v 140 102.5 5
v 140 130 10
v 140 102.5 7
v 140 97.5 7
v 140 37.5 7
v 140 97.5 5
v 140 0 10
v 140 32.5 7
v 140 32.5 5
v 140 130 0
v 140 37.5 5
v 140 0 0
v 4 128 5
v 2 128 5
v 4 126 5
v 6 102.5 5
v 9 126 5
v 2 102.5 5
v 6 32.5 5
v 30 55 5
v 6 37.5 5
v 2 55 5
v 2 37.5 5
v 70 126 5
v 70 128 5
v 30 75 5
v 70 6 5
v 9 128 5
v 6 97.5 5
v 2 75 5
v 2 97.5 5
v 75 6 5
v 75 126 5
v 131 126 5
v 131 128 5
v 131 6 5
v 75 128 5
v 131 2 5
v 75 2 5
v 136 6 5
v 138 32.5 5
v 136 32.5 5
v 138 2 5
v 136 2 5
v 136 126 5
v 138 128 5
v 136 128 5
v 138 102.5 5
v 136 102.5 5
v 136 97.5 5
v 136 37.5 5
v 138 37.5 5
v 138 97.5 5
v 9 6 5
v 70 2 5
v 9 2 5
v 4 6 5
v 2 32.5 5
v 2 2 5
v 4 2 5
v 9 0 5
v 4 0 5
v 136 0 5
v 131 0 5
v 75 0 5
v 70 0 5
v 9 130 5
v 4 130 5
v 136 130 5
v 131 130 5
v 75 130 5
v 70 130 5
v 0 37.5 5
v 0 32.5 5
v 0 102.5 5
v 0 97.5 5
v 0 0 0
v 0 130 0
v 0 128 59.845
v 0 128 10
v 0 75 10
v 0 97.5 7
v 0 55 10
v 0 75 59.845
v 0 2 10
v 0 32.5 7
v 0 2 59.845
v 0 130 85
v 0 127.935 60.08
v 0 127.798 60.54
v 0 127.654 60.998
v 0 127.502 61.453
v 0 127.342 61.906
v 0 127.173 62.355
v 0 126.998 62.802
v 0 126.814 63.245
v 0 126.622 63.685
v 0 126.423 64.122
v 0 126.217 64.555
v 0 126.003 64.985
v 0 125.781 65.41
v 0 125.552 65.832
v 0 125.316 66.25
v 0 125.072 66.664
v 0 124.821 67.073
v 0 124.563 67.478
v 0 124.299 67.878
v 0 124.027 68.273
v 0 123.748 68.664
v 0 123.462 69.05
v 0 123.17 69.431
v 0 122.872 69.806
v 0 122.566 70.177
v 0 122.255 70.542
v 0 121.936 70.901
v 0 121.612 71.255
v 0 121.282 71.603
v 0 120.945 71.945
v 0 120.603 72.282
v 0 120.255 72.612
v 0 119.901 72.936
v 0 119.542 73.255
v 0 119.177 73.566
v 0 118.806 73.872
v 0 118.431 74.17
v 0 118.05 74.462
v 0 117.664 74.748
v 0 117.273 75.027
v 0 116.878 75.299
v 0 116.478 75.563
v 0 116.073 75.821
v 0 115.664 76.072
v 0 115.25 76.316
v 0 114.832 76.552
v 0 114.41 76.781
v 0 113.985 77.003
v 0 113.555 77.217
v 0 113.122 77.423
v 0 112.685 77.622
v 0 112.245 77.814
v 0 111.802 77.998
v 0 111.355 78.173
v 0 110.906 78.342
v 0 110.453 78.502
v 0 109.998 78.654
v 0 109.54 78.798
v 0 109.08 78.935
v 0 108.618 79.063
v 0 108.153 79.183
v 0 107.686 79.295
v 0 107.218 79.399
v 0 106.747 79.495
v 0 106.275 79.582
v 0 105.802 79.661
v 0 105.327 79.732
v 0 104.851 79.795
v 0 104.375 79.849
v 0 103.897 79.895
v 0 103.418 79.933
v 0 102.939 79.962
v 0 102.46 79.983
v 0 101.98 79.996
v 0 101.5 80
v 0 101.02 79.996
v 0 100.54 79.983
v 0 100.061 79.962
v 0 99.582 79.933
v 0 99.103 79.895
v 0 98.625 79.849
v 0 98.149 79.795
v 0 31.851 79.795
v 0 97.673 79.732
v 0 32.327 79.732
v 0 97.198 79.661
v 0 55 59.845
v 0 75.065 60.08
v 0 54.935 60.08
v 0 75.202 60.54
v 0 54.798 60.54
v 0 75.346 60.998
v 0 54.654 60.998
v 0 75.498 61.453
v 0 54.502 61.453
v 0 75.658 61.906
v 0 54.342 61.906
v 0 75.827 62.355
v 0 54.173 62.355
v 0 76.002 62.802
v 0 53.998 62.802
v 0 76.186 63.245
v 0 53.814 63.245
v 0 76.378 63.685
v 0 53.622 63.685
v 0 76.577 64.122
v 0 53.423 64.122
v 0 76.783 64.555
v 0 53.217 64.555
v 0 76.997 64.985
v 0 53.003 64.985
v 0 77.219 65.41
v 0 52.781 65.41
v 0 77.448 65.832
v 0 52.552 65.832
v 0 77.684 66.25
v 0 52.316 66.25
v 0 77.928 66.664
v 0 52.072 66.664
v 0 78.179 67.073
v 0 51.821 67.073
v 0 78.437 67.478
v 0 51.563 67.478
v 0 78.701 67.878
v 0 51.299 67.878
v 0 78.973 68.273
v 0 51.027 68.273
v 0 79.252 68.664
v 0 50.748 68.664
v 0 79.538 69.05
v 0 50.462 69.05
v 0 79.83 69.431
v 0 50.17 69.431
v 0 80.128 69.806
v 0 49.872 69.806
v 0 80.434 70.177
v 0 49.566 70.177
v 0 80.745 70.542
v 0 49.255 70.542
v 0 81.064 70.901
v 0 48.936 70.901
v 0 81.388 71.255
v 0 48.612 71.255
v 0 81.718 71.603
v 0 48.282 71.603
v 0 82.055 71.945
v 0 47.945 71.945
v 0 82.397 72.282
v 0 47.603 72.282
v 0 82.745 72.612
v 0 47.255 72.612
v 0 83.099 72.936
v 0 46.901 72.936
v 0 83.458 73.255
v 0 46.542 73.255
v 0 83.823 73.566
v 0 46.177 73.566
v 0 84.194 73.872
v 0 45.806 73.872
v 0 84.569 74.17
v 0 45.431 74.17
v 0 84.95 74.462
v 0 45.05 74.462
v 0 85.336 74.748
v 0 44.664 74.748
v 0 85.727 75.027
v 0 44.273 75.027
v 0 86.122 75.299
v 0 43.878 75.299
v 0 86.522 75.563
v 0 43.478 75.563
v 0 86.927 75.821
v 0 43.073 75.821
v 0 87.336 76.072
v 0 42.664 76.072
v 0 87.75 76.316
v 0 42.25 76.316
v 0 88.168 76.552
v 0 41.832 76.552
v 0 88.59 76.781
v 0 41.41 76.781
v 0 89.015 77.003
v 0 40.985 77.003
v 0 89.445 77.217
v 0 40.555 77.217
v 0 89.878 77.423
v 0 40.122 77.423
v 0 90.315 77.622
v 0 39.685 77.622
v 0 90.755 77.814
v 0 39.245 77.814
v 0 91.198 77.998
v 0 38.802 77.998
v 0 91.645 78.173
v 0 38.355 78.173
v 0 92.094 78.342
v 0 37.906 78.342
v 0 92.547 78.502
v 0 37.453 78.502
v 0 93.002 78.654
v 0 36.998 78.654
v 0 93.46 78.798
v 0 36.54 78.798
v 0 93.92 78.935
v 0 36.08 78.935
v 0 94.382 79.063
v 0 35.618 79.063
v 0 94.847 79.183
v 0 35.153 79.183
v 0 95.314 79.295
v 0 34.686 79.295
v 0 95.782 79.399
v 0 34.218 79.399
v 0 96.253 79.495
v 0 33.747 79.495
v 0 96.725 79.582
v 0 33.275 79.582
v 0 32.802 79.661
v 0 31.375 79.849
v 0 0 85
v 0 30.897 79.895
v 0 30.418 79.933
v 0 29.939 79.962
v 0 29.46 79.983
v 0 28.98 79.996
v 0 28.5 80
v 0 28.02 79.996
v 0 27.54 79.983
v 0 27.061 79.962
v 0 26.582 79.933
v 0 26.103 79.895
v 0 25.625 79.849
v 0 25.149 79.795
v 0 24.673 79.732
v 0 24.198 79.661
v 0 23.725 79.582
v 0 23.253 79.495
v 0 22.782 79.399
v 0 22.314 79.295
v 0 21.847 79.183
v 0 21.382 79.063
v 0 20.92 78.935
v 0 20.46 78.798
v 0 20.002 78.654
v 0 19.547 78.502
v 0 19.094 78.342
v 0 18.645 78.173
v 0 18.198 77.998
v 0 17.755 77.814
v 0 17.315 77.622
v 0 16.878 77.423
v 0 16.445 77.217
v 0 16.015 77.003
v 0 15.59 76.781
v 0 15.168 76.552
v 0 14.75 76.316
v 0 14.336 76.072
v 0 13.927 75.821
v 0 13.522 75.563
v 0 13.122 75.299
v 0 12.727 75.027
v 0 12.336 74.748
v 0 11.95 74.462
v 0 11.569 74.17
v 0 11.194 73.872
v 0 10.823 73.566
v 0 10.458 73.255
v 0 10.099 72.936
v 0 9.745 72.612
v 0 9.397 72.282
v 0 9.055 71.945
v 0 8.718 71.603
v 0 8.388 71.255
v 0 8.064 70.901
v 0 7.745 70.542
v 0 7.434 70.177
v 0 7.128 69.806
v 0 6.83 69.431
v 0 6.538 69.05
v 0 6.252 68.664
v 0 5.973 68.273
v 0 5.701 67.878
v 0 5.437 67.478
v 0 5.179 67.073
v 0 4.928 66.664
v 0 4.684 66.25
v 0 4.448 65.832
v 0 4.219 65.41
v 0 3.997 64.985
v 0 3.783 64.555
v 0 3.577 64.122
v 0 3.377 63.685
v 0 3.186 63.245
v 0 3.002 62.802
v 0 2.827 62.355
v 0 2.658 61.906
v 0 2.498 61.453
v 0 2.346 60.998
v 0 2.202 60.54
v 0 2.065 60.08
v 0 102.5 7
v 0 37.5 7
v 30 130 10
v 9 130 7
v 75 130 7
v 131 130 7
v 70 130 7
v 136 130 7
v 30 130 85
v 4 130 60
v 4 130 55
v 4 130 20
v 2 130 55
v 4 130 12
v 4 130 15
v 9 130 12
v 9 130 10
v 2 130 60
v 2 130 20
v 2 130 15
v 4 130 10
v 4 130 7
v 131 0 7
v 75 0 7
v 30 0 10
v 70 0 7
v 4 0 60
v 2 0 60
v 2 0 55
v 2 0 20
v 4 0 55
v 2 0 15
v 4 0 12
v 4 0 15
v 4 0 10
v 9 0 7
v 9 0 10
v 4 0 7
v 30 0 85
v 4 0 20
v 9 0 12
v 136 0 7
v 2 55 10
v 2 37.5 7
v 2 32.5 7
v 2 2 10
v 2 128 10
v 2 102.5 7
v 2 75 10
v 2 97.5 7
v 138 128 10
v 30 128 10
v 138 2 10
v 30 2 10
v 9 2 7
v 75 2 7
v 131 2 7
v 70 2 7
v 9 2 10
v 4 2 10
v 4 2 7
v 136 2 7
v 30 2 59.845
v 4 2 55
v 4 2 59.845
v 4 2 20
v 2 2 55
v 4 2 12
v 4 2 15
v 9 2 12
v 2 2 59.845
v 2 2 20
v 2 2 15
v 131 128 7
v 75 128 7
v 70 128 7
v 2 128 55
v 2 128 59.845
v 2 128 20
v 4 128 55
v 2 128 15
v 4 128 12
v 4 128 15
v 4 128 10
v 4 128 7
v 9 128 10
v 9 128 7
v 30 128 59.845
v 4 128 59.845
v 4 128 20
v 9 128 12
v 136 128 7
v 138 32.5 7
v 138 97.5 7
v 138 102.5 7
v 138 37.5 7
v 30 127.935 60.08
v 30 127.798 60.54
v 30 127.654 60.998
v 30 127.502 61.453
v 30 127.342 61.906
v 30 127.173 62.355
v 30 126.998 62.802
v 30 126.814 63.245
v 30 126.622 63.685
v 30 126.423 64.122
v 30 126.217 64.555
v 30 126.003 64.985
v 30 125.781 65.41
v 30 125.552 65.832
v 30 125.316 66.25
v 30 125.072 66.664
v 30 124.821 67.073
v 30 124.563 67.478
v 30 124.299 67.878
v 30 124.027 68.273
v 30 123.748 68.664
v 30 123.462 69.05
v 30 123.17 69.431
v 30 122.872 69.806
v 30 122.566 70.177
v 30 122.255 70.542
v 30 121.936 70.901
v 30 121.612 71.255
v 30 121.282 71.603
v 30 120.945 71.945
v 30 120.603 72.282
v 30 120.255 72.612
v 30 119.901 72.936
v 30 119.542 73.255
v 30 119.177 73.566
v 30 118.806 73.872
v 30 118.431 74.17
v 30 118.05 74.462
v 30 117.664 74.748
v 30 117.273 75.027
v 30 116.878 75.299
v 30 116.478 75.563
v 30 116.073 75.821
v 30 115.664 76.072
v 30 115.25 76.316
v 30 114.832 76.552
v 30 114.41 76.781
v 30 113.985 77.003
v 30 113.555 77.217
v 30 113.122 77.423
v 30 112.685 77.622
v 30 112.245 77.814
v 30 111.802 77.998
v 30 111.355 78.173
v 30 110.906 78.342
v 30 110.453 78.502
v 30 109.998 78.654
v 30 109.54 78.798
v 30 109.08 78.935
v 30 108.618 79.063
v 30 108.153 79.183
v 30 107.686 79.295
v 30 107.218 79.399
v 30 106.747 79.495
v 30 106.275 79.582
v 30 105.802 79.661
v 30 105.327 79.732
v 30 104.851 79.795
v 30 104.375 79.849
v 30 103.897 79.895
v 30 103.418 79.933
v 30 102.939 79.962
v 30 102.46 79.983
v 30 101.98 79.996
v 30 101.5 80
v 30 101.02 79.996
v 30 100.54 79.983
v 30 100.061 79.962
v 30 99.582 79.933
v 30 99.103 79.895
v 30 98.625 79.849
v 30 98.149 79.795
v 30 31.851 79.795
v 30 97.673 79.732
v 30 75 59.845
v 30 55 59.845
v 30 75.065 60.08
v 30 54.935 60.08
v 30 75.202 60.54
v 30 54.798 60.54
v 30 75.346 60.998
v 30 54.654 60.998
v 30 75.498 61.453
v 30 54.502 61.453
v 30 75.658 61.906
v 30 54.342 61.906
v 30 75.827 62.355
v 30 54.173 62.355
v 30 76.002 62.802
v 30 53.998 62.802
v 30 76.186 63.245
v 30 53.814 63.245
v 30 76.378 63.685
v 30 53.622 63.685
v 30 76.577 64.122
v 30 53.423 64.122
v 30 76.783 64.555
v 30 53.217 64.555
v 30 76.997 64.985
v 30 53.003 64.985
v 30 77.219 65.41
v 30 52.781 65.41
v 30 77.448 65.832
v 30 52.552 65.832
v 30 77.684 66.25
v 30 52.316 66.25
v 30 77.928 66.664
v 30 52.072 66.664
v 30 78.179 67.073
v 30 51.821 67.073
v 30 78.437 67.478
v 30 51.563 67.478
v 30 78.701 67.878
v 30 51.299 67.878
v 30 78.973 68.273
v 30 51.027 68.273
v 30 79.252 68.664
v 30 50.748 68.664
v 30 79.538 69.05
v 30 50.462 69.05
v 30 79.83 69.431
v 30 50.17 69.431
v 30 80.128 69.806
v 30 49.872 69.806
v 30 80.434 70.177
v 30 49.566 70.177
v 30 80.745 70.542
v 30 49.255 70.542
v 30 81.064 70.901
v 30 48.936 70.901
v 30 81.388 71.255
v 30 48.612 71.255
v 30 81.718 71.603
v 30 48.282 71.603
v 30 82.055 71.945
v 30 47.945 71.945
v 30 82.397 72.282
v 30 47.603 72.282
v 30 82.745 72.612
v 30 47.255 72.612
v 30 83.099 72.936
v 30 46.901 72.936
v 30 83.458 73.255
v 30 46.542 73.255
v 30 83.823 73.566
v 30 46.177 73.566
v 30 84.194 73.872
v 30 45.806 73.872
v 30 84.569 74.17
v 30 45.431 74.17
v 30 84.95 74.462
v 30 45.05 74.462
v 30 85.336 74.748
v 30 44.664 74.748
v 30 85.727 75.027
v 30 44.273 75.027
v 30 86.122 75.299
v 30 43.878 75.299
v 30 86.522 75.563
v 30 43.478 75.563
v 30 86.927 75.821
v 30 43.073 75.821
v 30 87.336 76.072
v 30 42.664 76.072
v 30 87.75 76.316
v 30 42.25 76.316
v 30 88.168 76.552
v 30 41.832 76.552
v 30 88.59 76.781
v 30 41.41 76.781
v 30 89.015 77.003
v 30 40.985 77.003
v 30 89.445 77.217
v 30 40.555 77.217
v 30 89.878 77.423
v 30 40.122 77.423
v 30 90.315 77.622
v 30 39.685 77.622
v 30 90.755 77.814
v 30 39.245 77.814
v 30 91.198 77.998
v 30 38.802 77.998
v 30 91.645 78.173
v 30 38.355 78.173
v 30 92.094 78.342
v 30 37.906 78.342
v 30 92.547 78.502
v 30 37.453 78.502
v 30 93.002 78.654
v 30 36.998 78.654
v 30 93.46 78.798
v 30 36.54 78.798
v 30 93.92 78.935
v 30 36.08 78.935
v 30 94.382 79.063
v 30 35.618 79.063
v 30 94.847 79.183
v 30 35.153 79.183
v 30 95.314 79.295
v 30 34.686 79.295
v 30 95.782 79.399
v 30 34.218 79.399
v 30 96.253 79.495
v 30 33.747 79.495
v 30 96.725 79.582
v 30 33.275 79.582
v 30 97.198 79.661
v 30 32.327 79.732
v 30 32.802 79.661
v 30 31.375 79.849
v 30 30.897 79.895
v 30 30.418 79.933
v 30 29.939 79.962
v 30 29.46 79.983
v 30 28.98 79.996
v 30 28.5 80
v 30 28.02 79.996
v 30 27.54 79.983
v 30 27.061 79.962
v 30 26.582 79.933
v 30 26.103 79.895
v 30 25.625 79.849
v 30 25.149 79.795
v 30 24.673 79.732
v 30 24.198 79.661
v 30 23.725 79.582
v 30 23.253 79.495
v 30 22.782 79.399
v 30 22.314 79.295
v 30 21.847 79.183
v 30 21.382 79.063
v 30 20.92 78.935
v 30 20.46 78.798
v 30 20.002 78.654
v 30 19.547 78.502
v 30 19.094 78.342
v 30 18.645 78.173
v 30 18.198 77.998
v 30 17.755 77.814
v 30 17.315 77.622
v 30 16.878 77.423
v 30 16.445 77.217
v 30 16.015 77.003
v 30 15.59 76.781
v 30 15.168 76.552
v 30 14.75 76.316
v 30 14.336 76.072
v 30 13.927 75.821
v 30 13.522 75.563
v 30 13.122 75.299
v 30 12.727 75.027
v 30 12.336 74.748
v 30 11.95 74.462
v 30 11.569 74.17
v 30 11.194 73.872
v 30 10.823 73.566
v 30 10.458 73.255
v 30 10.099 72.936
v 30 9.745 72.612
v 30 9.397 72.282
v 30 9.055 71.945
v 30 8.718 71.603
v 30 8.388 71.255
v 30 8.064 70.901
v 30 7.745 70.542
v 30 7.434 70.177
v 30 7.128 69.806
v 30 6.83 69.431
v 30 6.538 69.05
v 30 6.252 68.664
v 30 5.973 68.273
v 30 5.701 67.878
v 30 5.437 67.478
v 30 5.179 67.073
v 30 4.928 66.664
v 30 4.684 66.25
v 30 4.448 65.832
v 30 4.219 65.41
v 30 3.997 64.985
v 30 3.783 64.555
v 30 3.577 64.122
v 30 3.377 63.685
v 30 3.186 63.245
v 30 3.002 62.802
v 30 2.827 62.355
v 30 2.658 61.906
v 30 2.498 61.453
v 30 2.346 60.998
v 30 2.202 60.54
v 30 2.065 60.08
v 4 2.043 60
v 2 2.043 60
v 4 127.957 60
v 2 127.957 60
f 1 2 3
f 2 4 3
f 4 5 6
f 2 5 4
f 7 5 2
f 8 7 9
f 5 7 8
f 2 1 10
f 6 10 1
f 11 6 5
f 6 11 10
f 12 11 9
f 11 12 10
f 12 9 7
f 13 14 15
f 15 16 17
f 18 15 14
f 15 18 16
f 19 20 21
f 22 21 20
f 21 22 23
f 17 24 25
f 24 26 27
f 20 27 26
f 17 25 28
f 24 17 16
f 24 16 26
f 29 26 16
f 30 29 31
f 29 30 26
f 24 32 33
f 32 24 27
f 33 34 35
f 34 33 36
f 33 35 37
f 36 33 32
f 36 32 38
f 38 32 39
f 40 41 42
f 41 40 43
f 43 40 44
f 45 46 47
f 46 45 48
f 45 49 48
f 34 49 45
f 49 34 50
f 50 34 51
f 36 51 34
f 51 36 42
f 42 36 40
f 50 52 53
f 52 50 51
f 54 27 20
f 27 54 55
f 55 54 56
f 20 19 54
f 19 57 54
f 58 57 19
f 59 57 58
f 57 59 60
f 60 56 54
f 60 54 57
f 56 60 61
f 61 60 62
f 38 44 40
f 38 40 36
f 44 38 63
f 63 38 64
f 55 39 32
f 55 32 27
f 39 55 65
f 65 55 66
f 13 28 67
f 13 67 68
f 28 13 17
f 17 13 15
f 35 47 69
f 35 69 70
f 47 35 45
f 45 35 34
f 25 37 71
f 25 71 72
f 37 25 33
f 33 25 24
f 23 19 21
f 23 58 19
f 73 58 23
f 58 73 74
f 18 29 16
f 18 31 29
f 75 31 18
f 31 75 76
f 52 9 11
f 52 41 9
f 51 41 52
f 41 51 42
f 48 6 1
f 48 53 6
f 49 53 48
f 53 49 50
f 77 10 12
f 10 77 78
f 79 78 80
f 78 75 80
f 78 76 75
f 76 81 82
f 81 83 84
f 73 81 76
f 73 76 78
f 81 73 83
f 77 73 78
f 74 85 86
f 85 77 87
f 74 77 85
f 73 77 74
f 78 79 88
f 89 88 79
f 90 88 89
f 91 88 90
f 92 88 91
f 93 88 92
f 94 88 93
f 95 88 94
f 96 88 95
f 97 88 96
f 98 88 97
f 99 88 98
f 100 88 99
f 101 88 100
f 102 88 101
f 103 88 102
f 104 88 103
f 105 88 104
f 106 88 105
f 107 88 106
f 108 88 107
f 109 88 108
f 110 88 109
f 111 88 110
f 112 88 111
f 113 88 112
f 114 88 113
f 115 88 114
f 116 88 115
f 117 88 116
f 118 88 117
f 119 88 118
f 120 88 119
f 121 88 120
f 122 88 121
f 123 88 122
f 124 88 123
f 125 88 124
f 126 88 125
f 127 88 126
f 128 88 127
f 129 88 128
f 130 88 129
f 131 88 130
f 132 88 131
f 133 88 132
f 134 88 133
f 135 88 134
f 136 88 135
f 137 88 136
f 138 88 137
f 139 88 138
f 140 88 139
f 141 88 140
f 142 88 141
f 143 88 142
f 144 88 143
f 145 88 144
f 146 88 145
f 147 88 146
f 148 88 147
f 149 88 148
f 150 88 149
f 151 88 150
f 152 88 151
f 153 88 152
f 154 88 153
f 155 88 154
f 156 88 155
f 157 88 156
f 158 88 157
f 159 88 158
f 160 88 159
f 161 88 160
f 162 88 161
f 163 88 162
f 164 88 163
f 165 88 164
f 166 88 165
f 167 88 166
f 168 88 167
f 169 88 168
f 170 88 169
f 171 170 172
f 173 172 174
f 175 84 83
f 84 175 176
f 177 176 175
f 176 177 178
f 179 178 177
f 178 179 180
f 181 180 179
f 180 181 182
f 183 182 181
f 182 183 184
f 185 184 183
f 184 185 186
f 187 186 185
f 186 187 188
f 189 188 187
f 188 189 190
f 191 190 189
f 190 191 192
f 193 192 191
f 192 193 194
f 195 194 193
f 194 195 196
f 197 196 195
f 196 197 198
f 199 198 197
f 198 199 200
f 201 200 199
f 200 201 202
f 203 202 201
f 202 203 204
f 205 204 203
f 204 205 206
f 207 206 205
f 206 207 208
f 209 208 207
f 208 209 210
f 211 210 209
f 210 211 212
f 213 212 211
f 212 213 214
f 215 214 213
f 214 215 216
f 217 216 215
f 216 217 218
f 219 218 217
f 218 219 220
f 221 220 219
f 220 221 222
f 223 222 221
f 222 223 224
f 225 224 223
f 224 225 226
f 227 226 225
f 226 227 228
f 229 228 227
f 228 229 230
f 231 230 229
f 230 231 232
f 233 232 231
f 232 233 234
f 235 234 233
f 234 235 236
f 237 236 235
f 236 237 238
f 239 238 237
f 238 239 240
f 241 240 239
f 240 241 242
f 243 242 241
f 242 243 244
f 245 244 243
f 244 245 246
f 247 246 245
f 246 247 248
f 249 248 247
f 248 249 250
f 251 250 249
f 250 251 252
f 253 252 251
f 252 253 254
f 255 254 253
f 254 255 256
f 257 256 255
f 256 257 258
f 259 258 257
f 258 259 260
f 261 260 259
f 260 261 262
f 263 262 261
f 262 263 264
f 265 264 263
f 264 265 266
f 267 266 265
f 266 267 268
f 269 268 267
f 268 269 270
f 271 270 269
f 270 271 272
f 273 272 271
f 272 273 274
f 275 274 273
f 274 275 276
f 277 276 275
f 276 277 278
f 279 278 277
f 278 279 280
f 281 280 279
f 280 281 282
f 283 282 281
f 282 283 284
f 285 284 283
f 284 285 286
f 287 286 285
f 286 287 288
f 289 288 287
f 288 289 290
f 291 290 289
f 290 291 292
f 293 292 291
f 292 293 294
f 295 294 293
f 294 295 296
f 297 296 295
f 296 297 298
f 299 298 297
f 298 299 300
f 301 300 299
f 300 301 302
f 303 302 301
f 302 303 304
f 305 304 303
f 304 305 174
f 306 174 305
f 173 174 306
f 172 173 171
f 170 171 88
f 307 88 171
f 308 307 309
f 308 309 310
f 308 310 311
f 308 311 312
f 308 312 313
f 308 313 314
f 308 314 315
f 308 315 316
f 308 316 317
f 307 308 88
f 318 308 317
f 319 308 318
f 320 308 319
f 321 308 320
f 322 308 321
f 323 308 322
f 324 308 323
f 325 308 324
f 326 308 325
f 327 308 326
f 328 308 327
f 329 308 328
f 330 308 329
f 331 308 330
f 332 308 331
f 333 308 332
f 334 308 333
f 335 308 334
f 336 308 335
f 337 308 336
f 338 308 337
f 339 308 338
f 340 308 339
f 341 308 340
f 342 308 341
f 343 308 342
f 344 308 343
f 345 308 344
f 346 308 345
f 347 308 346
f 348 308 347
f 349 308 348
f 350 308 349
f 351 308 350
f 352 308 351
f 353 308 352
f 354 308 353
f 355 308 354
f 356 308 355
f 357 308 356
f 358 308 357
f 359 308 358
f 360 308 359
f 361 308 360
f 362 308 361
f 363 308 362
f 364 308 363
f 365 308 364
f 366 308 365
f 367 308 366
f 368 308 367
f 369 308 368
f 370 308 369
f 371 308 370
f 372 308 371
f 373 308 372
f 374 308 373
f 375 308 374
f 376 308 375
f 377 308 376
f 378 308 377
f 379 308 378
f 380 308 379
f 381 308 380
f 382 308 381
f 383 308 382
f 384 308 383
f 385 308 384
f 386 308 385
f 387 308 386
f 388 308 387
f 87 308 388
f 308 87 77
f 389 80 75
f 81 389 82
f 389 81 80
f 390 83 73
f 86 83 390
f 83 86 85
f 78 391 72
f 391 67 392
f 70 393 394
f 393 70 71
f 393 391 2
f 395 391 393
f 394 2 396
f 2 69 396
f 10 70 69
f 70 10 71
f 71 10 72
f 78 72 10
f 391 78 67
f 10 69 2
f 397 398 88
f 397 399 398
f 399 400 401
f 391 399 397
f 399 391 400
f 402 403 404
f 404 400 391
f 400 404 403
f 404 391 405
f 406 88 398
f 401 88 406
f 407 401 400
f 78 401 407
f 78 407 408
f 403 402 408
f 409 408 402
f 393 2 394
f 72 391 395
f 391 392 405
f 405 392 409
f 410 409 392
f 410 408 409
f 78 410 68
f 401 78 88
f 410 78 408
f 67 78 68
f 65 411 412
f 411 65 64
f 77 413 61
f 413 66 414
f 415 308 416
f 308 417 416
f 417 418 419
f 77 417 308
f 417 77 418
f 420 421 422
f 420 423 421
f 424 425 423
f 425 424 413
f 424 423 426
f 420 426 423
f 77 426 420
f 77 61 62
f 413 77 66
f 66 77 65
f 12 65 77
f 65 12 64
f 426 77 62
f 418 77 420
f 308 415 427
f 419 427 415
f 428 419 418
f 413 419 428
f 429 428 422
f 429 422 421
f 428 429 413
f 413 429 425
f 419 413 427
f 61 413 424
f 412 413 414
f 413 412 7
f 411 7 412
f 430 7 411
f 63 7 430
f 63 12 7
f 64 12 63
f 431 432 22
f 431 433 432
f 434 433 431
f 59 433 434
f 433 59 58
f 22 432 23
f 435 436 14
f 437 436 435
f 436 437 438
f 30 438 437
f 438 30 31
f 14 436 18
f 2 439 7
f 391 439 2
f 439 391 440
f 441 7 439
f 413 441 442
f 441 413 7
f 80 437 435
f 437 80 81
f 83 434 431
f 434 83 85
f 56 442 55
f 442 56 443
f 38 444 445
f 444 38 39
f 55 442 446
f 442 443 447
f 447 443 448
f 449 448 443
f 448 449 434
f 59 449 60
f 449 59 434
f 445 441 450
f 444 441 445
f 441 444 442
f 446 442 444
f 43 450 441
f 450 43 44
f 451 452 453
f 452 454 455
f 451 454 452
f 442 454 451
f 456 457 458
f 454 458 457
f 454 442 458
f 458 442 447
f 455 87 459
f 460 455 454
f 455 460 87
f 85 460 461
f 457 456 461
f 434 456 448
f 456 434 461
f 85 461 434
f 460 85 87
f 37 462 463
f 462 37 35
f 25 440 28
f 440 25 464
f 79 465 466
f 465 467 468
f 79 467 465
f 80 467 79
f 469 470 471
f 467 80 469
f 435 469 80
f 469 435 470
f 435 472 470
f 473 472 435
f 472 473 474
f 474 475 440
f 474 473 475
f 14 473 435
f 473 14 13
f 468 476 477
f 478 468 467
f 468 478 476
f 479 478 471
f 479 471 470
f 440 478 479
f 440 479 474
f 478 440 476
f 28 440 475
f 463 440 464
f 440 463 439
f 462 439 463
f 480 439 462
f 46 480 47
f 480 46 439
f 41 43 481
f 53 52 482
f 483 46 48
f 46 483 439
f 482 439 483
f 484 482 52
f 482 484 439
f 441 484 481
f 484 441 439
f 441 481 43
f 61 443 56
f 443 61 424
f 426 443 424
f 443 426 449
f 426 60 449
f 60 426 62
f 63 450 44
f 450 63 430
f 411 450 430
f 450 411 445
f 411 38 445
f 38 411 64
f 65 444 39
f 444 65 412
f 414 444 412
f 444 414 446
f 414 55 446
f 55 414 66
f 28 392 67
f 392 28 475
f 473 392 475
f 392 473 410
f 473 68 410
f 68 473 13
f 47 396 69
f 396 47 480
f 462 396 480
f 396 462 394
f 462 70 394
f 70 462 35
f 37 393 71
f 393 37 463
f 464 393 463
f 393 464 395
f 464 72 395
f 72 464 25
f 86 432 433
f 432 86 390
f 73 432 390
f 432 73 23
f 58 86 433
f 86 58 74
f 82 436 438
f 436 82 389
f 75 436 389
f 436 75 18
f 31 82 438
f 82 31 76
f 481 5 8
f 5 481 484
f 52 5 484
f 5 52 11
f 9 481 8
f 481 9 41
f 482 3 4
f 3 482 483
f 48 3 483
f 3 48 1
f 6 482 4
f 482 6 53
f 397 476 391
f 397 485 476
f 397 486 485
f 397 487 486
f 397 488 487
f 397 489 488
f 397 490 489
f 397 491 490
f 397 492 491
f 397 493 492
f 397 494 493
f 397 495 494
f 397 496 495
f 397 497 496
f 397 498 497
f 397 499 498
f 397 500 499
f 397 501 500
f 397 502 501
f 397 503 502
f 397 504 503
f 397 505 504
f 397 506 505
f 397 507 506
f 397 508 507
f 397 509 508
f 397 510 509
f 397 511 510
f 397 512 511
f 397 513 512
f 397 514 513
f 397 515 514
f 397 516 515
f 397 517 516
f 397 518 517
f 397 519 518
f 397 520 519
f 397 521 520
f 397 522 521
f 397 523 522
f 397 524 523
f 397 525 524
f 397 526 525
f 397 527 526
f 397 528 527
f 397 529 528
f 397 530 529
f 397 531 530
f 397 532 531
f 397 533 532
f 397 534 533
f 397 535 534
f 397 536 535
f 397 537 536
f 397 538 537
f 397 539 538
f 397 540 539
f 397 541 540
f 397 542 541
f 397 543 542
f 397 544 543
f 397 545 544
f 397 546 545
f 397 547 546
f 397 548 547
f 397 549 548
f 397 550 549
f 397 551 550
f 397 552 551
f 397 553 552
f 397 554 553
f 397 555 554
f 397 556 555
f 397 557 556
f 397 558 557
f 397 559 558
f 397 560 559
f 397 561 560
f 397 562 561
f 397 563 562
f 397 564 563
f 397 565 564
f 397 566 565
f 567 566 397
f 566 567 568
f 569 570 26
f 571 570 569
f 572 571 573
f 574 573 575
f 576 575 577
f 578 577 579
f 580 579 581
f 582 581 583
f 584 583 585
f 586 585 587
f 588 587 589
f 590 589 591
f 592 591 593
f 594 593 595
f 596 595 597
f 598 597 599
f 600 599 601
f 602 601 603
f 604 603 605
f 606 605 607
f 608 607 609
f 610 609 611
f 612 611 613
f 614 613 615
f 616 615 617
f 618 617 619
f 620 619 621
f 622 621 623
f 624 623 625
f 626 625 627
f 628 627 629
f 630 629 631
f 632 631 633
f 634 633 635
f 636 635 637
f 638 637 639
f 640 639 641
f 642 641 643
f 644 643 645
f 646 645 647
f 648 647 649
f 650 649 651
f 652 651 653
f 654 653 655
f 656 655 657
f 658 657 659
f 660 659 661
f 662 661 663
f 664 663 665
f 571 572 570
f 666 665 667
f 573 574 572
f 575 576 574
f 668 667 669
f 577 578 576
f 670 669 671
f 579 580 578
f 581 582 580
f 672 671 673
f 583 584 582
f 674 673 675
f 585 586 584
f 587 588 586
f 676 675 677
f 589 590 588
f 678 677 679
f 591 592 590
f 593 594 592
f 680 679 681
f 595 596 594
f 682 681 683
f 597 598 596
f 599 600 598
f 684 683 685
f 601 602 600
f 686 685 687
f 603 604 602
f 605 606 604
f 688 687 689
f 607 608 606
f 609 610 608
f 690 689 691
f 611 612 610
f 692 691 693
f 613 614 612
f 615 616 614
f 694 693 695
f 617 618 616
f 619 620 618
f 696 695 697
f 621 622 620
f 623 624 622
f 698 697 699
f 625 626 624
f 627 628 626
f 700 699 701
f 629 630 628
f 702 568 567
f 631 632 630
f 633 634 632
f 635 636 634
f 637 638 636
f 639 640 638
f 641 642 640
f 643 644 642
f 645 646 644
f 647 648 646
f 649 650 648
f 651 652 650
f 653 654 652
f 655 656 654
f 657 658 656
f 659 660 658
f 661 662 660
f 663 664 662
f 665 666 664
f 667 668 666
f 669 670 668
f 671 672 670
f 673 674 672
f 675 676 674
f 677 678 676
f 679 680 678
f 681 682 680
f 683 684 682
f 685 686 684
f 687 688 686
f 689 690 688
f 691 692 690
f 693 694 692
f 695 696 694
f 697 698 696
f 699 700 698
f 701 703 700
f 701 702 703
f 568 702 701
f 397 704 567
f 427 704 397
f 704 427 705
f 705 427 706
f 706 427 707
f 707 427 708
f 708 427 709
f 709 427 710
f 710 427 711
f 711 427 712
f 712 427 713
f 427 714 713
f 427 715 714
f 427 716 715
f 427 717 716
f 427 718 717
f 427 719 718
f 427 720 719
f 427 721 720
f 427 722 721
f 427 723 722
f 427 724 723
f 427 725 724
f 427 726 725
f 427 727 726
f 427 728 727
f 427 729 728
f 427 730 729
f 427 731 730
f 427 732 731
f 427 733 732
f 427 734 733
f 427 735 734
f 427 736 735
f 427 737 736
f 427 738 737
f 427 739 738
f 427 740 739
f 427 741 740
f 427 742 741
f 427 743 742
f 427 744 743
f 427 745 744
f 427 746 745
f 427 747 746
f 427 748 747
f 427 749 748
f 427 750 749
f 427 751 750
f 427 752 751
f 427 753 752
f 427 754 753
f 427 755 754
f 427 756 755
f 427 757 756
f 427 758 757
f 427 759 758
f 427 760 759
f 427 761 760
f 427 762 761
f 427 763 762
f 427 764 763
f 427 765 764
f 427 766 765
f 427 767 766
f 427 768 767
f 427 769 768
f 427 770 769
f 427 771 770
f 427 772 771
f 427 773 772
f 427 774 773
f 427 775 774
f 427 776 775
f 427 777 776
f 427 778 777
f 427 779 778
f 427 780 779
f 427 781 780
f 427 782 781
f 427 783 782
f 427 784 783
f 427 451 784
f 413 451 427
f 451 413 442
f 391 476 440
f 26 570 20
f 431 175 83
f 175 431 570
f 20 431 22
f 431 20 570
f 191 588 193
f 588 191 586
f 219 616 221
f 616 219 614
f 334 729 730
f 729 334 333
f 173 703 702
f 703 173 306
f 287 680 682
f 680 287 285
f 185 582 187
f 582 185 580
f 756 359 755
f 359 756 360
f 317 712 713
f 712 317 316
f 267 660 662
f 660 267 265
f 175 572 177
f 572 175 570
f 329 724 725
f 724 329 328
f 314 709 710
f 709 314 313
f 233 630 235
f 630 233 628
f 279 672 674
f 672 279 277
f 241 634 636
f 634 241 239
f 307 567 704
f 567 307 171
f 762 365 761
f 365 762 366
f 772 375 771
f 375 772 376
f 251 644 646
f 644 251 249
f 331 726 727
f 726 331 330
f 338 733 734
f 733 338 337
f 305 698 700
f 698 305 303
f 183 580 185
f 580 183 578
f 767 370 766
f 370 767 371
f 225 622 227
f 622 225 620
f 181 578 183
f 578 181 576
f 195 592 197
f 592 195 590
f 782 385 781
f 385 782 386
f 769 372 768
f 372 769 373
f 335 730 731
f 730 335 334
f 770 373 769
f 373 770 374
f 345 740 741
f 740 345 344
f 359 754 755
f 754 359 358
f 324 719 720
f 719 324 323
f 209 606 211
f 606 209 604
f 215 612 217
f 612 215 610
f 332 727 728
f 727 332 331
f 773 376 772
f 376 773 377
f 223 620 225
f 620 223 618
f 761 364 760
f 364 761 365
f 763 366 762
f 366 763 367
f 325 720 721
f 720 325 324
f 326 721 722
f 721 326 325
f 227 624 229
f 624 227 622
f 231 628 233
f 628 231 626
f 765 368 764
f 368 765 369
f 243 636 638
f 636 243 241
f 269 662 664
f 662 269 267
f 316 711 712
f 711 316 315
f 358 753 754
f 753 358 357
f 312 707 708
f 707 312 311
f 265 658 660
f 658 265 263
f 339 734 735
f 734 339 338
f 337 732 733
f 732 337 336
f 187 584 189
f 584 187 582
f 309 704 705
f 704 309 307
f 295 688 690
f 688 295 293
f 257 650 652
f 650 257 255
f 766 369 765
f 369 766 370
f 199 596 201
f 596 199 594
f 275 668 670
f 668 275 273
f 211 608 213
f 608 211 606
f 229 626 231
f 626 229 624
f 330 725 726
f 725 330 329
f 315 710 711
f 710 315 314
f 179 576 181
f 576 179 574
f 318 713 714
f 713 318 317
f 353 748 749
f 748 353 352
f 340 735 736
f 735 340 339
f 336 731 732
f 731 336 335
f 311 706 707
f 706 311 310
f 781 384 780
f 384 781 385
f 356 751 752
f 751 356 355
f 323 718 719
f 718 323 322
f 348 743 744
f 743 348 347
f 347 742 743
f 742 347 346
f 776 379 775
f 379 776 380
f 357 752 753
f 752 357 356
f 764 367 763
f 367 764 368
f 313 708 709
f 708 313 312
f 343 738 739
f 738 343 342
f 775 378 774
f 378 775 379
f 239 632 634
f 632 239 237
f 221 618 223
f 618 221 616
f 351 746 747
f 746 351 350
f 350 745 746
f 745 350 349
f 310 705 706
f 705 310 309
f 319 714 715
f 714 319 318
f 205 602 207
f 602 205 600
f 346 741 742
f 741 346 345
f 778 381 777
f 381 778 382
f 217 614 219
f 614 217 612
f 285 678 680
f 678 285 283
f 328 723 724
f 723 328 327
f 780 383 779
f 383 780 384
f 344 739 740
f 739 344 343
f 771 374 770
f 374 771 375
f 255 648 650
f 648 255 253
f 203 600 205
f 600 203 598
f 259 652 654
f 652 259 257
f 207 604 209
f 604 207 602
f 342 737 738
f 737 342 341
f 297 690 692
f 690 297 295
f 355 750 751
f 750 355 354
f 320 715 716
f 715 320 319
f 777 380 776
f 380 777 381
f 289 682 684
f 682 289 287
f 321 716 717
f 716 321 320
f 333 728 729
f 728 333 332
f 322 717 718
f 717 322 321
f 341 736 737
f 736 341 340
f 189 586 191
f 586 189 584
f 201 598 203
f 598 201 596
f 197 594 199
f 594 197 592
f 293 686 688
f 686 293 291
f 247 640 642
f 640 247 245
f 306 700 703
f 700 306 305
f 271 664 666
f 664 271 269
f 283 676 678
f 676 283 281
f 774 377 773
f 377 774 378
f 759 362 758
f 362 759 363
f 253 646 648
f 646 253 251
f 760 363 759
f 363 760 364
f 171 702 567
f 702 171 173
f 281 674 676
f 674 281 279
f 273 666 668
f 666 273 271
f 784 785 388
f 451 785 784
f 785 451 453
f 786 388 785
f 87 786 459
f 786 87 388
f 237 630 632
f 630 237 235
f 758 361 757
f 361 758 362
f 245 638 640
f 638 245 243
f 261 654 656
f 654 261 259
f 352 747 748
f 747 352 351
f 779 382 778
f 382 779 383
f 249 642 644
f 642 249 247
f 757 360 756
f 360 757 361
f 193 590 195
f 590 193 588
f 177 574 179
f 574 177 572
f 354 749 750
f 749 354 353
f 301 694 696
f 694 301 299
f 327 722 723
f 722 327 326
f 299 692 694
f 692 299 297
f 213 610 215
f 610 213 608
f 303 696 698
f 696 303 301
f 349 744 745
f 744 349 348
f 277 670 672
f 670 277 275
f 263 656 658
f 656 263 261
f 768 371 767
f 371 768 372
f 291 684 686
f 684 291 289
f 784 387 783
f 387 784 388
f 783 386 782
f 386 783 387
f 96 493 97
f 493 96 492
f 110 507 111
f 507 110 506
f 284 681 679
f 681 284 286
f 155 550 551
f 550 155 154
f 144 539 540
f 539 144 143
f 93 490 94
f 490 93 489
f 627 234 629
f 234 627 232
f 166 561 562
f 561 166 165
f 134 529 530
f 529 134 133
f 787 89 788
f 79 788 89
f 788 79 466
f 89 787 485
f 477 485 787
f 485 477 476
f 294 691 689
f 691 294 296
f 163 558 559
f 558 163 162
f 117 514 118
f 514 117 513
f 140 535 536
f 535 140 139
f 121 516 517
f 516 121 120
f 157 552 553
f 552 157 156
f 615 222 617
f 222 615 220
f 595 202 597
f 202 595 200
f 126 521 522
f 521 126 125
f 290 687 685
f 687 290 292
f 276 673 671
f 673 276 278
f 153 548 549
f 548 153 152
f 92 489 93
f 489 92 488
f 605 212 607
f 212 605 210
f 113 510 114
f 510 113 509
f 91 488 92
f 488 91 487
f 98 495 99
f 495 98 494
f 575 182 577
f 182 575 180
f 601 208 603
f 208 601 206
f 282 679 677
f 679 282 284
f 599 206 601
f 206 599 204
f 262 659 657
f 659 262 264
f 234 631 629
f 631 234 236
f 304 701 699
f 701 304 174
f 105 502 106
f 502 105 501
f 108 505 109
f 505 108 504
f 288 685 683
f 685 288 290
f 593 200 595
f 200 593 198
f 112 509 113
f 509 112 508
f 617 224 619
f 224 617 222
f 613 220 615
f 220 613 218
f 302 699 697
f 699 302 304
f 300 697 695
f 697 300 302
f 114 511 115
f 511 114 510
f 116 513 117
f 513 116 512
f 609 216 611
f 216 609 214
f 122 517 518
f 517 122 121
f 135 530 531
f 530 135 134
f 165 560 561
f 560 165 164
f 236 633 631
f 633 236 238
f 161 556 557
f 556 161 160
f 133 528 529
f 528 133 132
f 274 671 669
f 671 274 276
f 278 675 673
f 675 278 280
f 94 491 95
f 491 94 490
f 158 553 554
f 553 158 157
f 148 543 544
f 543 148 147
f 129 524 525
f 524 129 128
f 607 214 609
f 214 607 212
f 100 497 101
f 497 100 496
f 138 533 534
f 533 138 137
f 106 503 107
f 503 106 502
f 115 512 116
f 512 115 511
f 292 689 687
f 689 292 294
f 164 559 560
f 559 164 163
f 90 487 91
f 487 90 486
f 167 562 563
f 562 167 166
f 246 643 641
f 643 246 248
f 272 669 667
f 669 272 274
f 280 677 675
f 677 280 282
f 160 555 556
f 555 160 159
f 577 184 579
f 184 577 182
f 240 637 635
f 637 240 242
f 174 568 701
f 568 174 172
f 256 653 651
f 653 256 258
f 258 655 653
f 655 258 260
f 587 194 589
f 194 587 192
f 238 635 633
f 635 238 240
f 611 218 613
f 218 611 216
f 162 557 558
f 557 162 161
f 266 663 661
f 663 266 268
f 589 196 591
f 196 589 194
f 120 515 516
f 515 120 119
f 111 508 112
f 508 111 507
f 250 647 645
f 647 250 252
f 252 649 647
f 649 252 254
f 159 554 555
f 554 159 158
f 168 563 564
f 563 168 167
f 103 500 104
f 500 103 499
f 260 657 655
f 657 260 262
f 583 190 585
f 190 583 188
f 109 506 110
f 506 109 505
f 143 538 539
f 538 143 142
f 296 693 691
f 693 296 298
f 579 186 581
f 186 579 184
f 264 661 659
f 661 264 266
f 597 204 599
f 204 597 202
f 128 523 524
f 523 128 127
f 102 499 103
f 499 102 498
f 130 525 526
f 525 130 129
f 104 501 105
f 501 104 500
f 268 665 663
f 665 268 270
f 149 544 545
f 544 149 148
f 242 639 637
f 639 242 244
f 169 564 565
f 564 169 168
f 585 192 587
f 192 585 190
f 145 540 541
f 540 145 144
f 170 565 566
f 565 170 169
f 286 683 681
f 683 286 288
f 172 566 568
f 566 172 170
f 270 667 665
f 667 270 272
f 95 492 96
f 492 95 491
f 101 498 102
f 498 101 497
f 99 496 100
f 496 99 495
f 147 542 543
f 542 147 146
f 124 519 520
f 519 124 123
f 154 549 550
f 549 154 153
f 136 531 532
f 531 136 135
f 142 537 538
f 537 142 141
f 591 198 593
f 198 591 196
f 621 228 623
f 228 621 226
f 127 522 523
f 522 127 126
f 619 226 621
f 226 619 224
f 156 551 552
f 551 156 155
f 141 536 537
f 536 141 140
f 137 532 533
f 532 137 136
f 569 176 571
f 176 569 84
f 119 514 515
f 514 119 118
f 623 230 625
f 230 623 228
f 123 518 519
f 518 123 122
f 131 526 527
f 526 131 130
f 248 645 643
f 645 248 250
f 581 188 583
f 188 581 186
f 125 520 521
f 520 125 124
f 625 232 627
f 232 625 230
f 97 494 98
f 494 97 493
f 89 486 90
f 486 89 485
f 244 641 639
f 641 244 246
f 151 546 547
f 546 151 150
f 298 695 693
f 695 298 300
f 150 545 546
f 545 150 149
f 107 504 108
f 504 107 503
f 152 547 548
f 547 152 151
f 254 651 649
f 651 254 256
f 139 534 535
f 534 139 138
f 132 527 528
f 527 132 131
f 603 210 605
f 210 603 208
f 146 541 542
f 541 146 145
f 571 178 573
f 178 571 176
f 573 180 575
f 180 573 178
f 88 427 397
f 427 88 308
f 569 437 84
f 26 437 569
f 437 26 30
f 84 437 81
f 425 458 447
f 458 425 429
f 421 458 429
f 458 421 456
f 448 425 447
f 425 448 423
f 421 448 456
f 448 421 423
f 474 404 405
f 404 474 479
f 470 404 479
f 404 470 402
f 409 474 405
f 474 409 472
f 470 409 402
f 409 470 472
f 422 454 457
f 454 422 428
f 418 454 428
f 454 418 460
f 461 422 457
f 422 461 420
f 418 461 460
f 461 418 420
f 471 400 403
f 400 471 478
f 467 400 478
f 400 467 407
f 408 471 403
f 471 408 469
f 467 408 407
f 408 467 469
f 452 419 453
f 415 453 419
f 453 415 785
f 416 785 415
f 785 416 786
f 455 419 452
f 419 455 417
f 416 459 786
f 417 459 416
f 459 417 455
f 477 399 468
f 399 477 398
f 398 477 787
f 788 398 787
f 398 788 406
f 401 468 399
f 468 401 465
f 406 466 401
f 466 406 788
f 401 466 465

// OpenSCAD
length=140;
width=130;
side_height=5;
side_width=2;
height=5;

module base_module(length=140, width=130, side_height=5, side_width=2, height=5) {
  difference(){
    union(){
      cube([length,width,height]);
      translate([0,0,height]) cube([side_width,width,height]);
      translate([0,0,height]) cube([length,side_width,height]);
      translate([0,width-side_width,height]) cube([length,side_width,height]);
      translate([length-side_width,0,height]) cube([side_width,width,height]);
    }
    translate([side_width*2,-side_width*2,height]) cube([5,10,2]);
    translate([length-5-(side_width*2),-side_width*2,height]) cube([5,10,2]);
    translate([length/2,-side_width*2,height]) cube([5,10,2]);
    
    translate([side_width*2,width-side_width*2,height]) cube([5,10,2]);
    translate([length-5-(side_width*2),width-side_width*2,height]) cube([5,10,2]);
    translate([length/2,width-side_width*2,height]) cube([5,10,2]);
    
    translate([-side_width*2,width/4,height]) cube([10,5,2]);
    translate([-side_width*2,(width/4)*3,height]) cube([10,5,2]);
    
    translate([length-side_width*2,width/4,height]) cube([10,5,2]);
    translate([length-side_width*2,(width/4)*3,height]) cube([10,5,2]);
  }
}

module roof(length=30){
  difference(){
  translate([0,0,50]) cube([length,55,30]);
  translate([length/2,28.5,52.5]) rotate([0,90,0]) cylinder(d=55, h=length+1, center=true, $fn=360);
  }
    
}

module back_right(){
  difference(){
    union(){
      base_module();
      translate([0,130-2,10]) cube([30,2,70]);
      translate([0,0,10]) cube([30,2,70]);
      translate([0,0,80]) cube([30,130,5]);
        
      translate([0,55,0]) cube([30,20,80]);
      roof(length=30);
      translate([0,73,0]) roof(length=30);
    }
    translate([side_width*2,-side_width*2,height+5]) cube([5,10,2]);
    translate([side_width*2,width-side_width*2,height+5]) cube([5,10,2]);
    
    translate([side_width,-side_width*2,height+10]) cube([2,10,5]);
    translate([side_width,width-side_width*2,height+10]) cube([2,10,5]);
   
    translate([side_width,-side_width*2,height+50]) cube([2,10,5]);
    translate([side_width,width-side_width*2,height+50]) cube([2,10,5]);
  }
}
module front_right(){
  difference(){
    union(){
      base_module();
      translate([0,130-2,10]) cube([140,2,70]);
      translate([0,0,10]) cube([140,2,70]);
      translate([0,0,80]) cube([140,130,5]);
    
      translate([0,55,0]) cube([140,20,80]);
      roof(length=140);
      translate([0,73,0]) roof(length=140);
    }
    
    translate([side_width*2,-side_width*2,height+5]) cube([5,10,2]);
    translate([length-5-(side_width*2),width-side_width*2,height+5]) cube([5,10,2]);
    translate([length/2,width-side_width*2,height+5]) cube([5,10,2]);
    
    translate([side_width*2,width-side_width*2,height+5]) cube([5,10,2]);
    translate([length-5-(side_width*2),-side_width*2,height+5]) cube([5,10,2]);
    translate([length/2,-side_width*2,height+5]) cube([5,10,2]);
    
    
    translate([length-(side_width*2),-side_width*2,height+10]) cube([2,10,5]);
    translate([length-(side_width*2),width-side_width*2,height+10]) cube([2,10,5]);
    
    translate([length-(side_width*2),-side_width*2,height+50]) cube([2,10,5]);
    translate([length-(side_width*2),width-side_width*2,height+50]) cube([2,10,5]);
  }
}
    
    
back_right();

//translate([0,-131,0]) back_right();
//
//translate([-141,0,0]) front_right();
//
//translate([-141,-131,0]) front_right();
